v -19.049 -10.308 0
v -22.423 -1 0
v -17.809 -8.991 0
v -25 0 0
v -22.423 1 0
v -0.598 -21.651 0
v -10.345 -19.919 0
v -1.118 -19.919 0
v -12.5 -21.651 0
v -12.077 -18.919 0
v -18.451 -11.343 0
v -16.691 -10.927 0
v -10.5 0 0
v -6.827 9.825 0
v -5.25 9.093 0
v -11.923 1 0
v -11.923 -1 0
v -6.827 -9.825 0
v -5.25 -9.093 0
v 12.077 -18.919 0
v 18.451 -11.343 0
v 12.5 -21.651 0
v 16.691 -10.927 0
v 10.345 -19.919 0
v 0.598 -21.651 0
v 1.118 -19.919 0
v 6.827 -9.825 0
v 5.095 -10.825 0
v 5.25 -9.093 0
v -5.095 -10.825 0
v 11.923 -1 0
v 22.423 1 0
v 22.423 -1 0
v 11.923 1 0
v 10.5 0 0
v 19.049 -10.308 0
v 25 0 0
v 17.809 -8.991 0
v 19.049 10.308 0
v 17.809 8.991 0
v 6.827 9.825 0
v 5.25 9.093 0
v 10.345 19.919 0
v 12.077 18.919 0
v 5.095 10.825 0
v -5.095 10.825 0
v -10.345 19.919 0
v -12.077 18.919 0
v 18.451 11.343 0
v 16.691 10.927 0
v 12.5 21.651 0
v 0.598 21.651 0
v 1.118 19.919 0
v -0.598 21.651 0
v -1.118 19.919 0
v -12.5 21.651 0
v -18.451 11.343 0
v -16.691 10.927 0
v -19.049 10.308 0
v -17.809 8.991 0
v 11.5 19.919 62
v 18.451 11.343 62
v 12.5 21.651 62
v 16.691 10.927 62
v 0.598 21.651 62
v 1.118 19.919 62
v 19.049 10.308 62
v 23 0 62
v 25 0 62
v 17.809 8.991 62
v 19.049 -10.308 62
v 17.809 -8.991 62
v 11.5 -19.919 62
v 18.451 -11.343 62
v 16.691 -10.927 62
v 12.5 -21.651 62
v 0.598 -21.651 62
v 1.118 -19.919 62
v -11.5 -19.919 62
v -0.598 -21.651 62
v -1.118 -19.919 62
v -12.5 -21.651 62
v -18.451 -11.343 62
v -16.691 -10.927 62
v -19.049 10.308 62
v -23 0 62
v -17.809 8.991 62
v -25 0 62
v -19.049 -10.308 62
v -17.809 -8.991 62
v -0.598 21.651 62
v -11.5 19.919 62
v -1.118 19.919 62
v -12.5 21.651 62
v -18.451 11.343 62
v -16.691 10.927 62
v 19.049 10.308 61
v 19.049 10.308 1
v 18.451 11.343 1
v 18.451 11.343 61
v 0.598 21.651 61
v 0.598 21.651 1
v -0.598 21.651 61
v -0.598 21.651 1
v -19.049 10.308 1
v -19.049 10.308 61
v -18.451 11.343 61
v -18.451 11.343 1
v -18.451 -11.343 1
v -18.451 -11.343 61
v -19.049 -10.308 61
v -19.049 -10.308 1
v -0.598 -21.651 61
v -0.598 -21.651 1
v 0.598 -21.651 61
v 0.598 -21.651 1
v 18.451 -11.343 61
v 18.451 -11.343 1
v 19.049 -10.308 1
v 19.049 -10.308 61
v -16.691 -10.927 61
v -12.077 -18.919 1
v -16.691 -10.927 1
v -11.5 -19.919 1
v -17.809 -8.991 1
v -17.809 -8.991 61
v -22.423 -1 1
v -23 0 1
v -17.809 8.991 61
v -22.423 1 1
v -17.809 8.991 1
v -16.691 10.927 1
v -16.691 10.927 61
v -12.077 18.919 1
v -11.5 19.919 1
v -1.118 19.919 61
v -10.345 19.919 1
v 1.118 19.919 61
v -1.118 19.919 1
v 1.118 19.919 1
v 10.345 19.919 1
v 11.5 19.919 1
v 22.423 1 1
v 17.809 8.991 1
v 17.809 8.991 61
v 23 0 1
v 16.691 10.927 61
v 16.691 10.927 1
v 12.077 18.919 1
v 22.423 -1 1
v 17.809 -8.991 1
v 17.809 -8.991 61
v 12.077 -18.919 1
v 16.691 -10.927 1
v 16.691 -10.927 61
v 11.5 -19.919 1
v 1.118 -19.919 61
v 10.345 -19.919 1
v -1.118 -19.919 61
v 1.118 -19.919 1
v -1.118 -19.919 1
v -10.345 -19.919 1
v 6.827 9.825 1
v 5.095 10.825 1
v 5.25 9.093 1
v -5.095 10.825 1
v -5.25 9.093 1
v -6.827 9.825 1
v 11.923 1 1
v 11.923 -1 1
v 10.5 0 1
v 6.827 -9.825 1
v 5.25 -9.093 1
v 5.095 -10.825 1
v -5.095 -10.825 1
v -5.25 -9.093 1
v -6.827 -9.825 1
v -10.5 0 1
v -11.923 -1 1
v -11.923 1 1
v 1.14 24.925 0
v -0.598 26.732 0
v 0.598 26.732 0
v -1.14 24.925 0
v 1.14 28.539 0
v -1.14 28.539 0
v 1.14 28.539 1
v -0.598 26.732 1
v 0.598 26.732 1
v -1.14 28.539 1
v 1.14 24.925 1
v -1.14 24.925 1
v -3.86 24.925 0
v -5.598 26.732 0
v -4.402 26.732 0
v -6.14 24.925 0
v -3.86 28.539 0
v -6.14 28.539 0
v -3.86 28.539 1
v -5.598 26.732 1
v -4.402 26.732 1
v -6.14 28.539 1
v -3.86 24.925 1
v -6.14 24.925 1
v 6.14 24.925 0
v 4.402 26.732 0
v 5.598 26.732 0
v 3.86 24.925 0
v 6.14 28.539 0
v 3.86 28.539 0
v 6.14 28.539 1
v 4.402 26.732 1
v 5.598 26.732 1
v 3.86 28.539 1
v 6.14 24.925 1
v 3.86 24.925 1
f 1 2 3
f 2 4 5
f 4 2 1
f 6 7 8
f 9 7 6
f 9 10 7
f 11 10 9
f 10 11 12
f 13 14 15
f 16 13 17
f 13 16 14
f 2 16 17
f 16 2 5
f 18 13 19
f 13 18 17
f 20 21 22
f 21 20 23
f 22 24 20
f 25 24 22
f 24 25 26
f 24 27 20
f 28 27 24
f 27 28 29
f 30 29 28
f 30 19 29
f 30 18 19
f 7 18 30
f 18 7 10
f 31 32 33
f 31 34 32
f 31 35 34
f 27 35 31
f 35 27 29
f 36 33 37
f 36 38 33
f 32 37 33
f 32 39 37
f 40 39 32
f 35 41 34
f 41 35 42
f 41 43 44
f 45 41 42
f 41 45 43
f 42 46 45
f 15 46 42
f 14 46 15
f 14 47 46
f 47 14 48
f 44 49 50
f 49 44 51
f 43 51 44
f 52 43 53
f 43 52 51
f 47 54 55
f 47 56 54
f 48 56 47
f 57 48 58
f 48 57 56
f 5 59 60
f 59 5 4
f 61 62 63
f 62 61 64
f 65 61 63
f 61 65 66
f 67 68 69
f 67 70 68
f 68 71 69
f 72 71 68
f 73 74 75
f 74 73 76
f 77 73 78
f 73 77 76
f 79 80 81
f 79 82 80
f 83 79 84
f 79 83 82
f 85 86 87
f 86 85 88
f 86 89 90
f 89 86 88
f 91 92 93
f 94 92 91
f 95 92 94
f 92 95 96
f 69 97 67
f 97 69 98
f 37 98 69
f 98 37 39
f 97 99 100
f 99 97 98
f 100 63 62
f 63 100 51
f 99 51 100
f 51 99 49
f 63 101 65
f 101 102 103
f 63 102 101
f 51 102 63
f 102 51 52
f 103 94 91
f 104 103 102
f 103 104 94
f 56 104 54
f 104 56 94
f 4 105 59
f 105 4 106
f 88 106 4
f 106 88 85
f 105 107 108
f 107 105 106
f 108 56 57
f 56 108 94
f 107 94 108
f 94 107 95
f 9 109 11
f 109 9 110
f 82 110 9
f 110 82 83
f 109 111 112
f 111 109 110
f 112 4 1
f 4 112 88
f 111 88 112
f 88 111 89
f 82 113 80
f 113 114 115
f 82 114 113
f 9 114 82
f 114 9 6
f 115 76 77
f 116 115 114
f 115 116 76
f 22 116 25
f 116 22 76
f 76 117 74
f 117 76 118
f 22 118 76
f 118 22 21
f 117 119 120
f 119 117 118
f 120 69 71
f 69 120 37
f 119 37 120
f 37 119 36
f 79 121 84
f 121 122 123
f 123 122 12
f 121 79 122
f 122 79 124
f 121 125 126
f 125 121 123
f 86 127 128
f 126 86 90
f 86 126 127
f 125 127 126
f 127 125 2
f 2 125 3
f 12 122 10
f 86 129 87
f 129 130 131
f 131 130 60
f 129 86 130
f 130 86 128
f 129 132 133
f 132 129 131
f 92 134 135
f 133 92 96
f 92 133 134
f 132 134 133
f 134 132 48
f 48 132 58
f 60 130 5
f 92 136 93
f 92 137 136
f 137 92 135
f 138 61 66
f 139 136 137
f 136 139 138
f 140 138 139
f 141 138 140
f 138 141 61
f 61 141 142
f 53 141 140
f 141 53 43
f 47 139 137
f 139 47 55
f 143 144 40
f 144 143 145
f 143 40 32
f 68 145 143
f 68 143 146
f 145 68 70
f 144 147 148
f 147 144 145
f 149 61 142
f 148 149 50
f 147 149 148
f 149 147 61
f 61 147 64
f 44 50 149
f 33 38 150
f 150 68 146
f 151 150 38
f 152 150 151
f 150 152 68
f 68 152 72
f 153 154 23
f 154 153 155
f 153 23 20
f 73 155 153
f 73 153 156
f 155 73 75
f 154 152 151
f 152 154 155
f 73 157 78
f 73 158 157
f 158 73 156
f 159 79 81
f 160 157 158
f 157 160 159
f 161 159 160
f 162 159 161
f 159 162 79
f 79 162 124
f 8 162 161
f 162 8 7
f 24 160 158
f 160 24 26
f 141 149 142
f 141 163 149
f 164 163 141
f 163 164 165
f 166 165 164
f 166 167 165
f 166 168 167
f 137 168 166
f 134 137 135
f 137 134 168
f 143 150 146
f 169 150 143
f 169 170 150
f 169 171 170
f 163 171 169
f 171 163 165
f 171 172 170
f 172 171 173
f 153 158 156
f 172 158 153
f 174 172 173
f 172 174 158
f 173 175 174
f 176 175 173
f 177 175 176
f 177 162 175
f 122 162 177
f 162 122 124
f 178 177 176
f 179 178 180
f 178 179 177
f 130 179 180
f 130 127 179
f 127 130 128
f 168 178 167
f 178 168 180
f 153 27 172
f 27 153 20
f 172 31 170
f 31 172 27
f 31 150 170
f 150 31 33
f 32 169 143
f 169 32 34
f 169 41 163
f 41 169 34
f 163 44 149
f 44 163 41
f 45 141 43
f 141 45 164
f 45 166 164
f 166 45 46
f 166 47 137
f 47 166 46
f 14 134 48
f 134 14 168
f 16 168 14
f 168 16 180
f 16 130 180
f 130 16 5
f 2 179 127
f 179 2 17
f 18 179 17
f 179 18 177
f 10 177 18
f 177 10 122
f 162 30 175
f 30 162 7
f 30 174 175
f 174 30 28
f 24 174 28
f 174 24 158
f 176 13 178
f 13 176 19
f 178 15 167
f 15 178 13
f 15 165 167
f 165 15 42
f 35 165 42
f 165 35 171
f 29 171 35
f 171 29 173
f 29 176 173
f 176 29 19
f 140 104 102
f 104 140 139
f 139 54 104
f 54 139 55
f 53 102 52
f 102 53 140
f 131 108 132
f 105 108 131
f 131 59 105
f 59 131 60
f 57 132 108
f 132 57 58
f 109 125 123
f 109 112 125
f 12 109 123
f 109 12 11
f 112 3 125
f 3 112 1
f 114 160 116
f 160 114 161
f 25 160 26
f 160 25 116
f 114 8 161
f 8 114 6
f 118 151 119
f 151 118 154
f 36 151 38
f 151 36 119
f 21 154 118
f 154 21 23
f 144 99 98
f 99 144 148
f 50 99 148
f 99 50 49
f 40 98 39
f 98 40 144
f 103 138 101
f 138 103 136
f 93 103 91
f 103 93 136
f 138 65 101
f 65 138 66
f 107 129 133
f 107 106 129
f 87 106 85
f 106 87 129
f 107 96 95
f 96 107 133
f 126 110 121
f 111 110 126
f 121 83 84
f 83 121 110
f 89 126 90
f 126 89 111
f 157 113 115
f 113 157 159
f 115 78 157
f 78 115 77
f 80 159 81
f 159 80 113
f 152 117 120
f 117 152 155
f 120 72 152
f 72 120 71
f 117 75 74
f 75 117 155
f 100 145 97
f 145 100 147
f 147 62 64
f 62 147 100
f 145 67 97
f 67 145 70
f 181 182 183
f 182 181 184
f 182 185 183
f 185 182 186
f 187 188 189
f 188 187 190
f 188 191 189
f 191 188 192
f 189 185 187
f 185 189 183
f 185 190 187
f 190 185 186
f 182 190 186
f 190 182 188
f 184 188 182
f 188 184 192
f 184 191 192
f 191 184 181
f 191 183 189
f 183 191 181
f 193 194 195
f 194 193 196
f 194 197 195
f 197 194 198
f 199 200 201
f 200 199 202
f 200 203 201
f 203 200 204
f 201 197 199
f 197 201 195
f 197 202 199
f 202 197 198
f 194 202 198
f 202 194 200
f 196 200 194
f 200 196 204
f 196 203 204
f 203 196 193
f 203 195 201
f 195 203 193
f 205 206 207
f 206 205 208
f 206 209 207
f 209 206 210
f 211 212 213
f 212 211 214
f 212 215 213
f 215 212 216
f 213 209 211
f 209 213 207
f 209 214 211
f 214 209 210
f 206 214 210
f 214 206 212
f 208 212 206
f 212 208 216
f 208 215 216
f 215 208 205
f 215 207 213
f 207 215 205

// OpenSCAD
// file: vars.scad
outer_r = 25;
thickness = 2;
sides = 6;
r_koef = 0.5;
height = 60;

side_angle = 360 / sides;
side_distance = cos(side_angle / 2) * outer_r;

inner_angle = 90 - side_angle;
wall_thickness = cos(inner_angle) * thickness;
// file: cell.scad
include <vars.scad>

module cell_joint(off = 0.075) {
    width = wall_thickness * 1.2;
    poly_coords = [
        [0, 0],
        [width, 0],
        [wall_thickness * 0.9, wall_thickness],
        [wall_thickness * 0.3, wall_thickness]
    ];
    translate([-width / 2, 0, 0]) {
        linear_extrude(thickness / 2) {
            offset(delta = off) {
                polygon(poly_coords);
                translate([0, wall_thickness * 2, 0])
                    mirror([0, 1, 0])
                        polygon(poly_coords);
            }
        }
    }
}

module cell() {
    difference() {
        union() {
            linear_extrude(height + thickness) {
                difference() {
                    circle(r=outer_r, $fn=sides);
                    circle(r=outer_r - thickness, $fn=sides);
                }
            }

            linear_extrude(thickness / 2) {
                for (i=[0:5]) {
                    rotate([0, 0, i * side_angle]) translate([outer_r * r_koef - thickness / 2, 0 - thickness / 2, 0]) square([outer_r - outer_r * r_koef, thickness]);
                }

                difference() {
                    circle(r=outer_r * r_koef, $fn=sides);
                    circle(r=outer_r * r_koef - thickness, $fn=sides);
                }
            }
        }
        for(x=[0,1]) {
            for (i=[0:5]) {
                rotate([0, 0, i * side_angle])
                    translate([0, side_distance - wall_thickness, x * height + x * thickness / 2])
                        cell_joint();
            }
        }
    }
}
// main file
include <cell.scad>

cell();

translate([0, outer_r, 0]) cell_joint();
translate([-5, outer_r, 0]) cell_joint();
translate([5, outer_r, 0]) cell_joint();
